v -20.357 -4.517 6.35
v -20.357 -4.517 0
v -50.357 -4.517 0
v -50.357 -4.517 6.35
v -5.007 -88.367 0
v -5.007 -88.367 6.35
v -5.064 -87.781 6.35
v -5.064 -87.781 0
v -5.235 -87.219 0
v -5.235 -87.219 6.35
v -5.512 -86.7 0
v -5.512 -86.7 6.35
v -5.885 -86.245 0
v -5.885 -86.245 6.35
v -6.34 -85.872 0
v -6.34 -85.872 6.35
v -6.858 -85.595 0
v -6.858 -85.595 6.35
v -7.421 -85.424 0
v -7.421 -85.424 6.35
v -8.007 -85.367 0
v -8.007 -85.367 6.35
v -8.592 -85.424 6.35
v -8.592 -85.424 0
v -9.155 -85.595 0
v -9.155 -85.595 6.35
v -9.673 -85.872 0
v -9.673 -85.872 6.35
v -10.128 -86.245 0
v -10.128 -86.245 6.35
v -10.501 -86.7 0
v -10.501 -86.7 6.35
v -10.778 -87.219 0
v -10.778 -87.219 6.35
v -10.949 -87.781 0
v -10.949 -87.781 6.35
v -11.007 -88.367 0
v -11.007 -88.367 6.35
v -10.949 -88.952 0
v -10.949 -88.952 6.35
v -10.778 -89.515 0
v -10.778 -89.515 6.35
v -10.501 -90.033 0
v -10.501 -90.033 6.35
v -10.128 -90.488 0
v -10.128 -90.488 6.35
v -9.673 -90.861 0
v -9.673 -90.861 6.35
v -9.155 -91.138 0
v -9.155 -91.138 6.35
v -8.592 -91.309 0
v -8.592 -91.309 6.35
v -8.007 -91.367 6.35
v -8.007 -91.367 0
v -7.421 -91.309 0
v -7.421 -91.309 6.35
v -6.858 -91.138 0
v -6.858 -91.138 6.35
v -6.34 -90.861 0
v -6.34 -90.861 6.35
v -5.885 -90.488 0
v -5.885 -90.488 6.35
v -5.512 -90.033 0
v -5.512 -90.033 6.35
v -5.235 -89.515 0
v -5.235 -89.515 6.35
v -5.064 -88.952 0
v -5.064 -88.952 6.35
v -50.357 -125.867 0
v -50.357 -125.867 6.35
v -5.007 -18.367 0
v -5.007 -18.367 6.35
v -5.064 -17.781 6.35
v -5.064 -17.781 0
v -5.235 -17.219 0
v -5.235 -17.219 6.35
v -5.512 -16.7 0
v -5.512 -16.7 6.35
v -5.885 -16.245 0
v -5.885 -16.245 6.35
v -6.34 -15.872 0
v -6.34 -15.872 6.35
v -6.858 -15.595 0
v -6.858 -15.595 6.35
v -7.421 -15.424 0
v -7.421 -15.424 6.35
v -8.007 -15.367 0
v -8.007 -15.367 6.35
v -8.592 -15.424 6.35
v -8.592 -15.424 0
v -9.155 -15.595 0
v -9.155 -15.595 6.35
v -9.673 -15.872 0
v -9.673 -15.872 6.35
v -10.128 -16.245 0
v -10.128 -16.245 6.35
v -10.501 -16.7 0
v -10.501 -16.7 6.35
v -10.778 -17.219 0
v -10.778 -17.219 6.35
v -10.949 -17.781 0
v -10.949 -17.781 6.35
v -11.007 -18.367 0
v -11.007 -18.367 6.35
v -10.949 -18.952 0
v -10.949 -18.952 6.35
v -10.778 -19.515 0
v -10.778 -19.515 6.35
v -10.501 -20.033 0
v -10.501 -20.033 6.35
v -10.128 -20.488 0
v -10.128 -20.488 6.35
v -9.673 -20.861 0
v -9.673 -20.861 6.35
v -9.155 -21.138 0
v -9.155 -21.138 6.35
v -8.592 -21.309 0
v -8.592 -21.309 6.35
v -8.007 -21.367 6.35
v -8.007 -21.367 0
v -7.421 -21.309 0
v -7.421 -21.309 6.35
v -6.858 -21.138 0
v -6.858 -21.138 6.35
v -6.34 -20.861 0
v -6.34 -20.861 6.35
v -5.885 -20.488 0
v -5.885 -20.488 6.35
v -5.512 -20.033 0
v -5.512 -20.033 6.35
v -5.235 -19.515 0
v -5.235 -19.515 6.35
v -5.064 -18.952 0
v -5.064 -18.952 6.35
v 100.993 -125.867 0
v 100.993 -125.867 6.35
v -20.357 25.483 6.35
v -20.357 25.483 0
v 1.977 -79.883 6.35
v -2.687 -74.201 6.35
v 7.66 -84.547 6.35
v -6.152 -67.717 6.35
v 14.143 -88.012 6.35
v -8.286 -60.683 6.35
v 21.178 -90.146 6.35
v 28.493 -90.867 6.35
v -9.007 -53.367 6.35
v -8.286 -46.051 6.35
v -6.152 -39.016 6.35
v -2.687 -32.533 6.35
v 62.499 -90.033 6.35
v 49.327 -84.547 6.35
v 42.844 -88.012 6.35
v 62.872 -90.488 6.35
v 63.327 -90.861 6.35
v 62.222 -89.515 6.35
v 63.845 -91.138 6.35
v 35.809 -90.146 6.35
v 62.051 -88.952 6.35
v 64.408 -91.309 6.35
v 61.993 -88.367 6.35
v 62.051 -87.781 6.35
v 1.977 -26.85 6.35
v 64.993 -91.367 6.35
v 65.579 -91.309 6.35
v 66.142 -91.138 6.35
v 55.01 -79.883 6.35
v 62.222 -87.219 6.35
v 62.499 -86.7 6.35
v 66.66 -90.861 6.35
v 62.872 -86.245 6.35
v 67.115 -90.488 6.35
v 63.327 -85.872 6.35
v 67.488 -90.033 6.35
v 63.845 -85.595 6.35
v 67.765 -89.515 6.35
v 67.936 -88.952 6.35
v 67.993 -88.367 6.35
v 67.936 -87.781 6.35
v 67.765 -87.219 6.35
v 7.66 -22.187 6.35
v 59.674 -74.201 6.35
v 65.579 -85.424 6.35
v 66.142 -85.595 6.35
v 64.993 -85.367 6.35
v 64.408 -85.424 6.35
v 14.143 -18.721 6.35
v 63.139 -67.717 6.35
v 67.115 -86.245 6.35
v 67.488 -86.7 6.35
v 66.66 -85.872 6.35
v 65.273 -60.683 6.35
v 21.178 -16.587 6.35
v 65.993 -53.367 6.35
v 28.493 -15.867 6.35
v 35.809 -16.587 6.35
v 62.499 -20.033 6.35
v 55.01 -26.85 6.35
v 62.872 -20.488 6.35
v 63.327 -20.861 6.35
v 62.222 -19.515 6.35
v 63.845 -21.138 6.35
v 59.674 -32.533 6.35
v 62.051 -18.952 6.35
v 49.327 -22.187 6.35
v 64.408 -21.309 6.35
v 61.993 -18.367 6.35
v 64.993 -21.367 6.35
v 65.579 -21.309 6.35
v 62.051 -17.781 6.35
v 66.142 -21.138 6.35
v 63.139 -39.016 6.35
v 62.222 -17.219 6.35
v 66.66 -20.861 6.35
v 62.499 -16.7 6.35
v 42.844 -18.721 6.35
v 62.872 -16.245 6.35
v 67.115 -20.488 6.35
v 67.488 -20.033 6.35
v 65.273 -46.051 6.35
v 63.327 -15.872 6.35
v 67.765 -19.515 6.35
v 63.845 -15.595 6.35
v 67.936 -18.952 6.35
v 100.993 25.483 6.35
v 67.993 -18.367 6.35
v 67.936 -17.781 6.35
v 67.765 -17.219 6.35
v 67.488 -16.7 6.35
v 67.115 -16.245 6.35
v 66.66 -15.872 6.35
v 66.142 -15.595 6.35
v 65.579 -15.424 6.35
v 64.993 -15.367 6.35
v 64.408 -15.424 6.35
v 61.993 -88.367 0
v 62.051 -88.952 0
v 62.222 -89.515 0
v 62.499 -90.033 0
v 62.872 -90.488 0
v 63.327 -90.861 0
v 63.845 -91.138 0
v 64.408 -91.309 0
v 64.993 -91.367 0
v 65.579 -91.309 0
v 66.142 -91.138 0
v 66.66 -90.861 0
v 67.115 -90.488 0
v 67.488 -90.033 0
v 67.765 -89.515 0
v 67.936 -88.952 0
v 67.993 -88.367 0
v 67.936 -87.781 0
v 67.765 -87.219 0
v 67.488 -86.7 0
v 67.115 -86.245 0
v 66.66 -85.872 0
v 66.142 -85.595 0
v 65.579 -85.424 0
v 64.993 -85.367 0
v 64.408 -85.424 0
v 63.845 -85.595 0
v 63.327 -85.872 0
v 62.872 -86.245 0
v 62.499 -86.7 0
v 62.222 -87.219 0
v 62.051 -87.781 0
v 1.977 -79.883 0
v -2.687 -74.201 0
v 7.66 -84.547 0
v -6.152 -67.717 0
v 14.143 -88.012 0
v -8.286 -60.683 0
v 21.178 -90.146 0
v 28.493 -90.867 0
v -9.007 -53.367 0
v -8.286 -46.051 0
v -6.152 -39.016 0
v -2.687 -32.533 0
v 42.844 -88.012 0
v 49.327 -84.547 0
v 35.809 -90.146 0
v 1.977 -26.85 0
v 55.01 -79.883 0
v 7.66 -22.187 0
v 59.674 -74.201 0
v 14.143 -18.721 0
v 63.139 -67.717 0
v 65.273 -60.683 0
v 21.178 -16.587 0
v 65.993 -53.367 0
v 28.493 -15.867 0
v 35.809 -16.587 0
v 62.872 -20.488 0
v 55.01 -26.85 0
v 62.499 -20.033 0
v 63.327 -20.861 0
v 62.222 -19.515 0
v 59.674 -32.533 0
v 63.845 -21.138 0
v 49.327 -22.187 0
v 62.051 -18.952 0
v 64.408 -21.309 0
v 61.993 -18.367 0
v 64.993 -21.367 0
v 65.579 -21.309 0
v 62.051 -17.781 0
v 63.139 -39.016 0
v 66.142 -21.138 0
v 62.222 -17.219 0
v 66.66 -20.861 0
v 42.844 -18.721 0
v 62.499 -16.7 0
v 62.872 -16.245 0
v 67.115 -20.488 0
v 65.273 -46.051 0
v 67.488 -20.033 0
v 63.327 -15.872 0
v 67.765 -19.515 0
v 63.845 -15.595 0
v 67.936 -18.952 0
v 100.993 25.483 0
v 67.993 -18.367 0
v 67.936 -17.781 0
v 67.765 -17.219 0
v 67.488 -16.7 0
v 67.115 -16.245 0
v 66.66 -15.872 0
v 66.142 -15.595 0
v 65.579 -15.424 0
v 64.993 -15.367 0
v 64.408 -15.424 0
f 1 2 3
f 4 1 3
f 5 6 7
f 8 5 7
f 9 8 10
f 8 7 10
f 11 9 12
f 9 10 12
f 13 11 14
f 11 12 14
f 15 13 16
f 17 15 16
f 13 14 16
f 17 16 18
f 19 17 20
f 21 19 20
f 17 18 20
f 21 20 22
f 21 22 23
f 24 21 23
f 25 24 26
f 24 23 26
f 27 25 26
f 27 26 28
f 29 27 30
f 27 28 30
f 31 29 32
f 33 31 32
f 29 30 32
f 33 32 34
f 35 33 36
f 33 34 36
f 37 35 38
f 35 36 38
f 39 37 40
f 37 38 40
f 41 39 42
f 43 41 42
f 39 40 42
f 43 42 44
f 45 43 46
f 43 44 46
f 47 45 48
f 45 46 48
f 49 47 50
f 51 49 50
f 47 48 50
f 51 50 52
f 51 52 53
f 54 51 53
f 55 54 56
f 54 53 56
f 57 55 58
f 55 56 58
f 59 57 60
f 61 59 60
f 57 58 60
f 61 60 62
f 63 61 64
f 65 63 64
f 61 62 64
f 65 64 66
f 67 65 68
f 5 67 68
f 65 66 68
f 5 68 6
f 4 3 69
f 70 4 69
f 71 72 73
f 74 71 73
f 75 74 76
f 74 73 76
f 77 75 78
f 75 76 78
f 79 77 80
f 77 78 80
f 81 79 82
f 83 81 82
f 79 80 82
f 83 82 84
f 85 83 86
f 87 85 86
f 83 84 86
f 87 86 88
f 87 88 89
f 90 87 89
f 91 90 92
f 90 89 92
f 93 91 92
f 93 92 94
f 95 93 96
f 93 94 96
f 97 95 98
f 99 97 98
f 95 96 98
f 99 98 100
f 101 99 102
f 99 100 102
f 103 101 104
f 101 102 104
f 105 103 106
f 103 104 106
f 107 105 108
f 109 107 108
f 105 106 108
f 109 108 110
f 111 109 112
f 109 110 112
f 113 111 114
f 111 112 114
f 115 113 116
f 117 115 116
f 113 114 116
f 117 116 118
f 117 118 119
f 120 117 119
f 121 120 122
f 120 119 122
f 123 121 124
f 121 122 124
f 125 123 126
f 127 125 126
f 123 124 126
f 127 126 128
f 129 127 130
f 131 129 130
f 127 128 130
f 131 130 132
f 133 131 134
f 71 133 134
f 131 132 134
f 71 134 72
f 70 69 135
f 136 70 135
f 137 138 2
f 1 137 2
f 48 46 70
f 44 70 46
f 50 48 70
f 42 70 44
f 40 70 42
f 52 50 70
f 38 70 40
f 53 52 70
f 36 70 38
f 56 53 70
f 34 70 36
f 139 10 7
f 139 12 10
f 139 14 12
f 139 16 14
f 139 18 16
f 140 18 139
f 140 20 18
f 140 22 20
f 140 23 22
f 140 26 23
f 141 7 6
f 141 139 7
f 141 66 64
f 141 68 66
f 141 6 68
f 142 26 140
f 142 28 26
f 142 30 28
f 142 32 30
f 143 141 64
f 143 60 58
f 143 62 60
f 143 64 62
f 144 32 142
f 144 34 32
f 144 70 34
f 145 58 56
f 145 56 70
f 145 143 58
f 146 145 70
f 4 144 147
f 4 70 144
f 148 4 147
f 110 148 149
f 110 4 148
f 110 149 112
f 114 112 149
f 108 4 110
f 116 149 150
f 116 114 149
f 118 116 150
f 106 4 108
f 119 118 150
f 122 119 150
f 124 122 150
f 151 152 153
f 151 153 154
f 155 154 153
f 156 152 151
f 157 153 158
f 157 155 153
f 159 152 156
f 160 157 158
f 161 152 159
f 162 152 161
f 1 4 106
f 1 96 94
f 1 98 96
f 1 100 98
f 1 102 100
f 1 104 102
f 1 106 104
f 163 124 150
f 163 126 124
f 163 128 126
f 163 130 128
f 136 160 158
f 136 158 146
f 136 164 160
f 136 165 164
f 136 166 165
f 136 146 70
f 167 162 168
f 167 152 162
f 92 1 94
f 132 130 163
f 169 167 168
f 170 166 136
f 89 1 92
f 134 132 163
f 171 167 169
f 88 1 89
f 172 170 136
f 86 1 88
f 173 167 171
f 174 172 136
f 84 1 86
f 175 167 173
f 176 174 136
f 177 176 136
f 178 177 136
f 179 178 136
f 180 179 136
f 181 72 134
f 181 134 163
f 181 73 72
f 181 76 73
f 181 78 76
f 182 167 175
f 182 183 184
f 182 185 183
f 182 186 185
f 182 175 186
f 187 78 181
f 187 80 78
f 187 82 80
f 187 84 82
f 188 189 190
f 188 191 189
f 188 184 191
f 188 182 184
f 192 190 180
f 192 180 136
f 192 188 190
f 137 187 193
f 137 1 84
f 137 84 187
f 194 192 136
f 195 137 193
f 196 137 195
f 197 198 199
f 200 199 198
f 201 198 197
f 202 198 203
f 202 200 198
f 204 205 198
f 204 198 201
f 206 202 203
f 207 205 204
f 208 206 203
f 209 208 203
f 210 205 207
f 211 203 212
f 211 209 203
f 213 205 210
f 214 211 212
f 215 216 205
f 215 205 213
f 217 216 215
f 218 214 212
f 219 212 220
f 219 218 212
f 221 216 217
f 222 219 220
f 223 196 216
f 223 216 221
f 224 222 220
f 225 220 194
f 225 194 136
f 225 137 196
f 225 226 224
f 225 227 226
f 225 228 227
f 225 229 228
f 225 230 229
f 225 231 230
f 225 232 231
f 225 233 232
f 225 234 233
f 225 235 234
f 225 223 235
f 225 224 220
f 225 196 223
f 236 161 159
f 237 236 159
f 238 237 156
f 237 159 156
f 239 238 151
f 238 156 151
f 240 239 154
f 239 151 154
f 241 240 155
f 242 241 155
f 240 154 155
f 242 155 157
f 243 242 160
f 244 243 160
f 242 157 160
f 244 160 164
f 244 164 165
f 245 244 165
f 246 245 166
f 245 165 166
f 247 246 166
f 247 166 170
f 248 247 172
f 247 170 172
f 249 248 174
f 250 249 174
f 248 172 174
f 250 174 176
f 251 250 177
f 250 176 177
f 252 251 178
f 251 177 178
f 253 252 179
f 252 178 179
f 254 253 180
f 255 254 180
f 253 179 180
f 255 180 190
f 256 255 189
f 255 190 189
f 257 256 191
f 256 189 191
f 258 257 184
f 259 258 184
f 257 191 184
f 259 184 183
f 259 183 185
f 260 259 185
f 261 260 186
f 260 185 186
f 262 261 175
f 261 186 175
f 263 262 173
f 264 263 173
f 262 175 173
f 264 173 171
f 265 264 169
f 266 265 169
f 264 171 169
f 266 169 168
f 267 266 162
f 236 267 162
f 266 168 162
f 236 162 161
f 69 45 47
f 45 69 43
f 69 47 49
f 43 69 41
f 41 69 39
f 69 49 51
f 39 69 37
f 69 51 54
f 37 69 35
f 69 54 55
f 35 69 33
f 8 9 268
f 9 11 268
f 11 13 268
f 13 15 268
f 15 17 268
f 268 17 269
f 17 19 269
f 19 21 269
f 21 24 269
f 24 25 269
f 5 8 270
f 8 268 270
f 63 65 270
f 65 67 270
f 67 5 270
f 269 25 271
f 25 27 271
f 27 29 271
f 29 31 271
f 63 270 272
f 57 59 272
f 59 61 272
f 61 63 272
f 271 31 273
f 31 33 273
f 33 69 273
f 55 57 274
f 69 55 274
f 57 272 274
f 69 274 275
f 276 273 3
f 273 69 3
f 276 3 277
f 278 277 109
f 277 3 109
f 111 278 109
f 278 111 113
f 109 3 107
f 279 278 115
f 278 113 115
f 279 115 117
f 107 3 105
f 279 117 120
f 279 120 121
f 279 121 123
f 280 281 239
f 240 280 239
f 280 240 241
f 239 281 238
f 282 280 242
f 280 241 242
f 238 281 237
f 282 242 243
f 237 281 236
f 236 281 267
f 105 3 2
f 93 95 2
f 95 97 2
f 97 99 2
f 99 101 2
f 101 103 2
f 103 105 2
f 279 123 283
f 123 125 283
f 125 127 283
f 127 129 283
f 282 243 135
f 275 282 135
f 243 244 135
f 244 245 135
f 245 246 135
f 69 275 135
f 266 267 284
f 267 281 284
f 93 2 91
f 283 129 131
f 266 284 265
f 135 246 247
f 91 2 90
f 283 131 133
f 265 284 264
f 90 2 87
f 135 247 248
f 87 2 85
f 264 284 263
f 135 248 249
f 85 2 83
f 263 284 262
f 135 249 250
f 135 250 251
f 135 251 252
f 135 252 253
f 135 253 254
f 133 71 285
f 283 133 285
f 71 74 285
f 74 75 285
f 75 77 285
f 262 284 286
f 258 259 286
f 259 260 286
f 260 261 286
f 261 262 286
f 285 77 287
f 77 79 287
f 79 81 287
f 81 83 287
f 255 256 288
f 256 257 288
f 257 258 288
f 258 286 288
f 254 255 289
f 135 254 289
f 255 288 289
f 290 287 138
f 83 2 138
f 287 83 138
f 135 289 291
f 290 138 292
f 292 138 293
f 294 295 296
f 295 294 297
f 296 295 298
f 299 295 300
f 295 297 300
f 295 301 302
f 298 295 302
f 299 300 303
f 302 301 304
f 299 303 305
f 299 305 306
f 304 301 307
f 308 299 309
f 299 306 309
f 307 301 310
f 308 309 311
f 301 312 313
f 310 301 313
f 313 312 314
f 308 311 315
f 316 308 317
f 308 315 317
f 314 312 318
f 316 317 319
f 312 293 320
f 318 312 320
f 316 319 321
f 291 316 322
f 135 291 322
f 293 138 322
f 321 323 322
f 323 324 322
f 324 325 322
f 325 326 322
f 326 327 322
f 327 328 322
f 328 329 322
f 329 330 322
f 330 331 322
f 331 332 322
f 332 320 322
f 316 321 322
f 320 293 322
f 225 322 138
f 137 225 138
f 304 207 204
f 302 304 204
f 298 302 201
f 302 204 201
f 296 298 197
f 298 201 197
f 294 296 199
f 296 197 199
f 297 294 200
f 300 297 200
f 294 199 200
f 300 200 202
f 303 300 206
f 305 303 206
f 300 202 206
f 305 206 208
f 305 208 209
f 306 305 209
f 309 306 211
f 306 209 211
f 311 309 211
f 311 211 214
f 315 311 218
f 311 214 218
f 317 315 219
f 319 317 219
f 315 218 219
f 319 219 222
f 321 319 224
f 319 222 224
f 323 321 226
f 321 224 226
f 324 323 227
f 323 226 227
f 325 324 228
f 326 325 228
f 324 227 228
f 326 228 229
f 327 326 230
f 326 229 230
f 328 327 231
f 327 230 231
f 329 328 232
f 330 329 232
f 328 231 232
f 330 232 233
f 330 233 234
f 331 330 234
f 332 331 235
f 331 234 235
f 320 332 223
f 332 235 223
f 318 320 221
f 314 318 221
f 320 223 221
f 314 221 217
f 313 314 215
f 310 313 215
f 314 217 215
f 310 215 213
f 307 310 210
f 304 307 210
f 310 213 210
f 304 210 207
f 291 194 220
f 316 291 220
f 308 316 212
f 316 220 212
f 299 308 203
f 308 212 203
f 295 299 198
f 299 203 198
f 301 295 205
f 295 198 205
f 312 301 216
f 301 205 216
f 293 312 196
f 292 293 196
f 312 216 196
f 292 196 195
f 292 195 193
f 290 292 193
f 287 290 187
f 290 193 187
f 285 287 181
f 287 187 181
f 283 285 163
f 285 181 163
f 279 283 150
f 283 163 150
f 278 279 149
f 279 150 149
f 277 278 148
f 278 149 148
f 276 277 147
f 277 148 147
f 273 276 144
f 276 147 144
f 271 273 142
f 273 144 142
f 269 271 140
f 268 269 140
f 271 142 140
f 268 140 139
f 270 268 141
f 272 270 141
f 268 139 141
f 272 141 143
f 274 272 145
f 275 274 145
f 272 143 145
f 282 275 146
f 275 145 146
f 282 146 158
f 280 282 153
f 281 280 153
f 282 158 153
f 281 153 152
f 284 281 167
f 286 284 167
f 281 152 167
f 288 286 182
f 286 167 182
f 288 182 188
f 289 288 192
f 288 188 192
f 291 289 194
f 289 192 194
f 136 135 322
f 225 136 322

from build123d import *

# Parameters (mm, degrees)
SALIENTE_EXTRUIR1_DEPTH = 6.35
CROQUIS2_R              = 37.5
CROQUIS2_R_2            = 3
CORTAR_EXTRUIR1_DEPTH   = 6.35


with BuildPart() as part:
    # Croquis1 → Saliente-Extruir1 (new body)
    with BuildSketch(Plane.XY):
        Polygon((-50.356515977, -4.516705607), (-50.356515977, -125.866705607), (100.993484023, -125.866705607), (100.993484023, 25.483294393), (-20.356515977, 25.483294393), (-20.356515977, -4.516705607), align=None)
    extrude(amount=SALIENTE_EXTRUIR1_DEPTH)

    # Croquis2 → Cortar-Extruir1 (cut)
    with BuildSketch(Plane.XY.offset(6.35)):
        with Locations((28.493484023, -53.366705607)):
            Circle(CROQUIS2_R)
        with Locations((-8.006515977, -18.366705607)):
            Circle(CROQUIS2_R_2)
        with Locations((-8.006515977, -88.366705607)):
            Circle(CROQUIS2_R_2)
        with Locations(Location((64.993484023, -18.366705607, 0), (0, 0, 180))):
            Circle(CROQUIS2_R_2)
        with Locations(Location((64.993484023, -88.366705607, 0), (0, 0, 180))):
            Circle(CROQUIS2_R_2)
    extrude(amount=-CORTAR_EXTRUIR1_DEPTH, mode=Mode.SUBTRACT)


solid = part.part
